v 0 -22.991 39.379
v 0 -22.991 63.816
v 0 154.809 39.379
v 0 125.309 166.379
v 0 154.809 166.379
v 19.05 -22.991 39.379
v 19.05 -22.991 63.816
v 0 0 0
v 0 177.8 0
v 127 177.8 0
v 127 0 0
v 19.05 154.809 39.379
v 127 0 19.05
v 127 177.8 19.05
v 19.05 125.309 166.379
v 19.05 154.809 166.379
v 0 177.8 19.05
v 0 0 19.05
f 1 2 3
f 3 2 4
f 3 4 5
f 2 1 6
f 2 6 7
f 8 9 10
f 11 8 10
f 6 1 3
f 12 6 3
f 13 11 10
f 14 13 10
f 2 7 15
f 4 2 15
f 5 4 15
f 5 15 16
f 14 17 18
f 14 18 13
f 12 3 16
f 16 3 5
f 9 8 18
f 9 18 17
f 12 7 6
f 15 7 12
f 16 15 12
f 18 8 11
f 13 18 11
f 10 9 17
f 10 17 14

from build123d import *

# Parameters (mm, degrees)
F0_W       = 127
F0_H       = 177.8
F1_DEPTH   = 19.05
F2_W       = 177.8
F2_H       = 127
F3_DEPTH   = 19.05
F3_FACE1_W = 177.8
F3_FACE1_H = 127
F5_DEPTH   = 25.4


with BuildPart() as f1:
    # F0 (on Top) → F1 (new body)
    with BuildSketch(Plane.XY):
        with Locations((63.5, 88.9)):
            Rectangle(F0_W, F0_H)
    extrude(amount=F1_DEPTH)


with BuildPart() as f3:
    # F2 (on Right) → F3 (new body)
    with BuildSketch(Plane.YZ):
        with Locations((65.9087030217, 102.8793881302)):
            Rectangle(F2_W, F2_H)
    extrude(amount=F3_DEPTH)

    # F4 (on face) + F3_face1 (on face) → F5 (cut)
    with BuildSketch(Plane.YZ.offset(19.05)):
        Polygon((-22.9912969783, 63.8163983822), (125.3091990948, 166.3793881302), (-22.9912969783, 166.3793881302), align=None)
    with BuildSketch(Plane(origin=(0, 65.9087030217, 102.8793881302), x_dir=(0, 1, 0), z_dir=(-1, 0, 0))):
        Rectangle(F3_FACE1_W, F3_FACE1_H)
    extrude(amount=-F5_DEPTH, dir=(1, 0, 0), mode=Mode.SUBTRACT)


solid = Compound([f1.part, f3.part])
